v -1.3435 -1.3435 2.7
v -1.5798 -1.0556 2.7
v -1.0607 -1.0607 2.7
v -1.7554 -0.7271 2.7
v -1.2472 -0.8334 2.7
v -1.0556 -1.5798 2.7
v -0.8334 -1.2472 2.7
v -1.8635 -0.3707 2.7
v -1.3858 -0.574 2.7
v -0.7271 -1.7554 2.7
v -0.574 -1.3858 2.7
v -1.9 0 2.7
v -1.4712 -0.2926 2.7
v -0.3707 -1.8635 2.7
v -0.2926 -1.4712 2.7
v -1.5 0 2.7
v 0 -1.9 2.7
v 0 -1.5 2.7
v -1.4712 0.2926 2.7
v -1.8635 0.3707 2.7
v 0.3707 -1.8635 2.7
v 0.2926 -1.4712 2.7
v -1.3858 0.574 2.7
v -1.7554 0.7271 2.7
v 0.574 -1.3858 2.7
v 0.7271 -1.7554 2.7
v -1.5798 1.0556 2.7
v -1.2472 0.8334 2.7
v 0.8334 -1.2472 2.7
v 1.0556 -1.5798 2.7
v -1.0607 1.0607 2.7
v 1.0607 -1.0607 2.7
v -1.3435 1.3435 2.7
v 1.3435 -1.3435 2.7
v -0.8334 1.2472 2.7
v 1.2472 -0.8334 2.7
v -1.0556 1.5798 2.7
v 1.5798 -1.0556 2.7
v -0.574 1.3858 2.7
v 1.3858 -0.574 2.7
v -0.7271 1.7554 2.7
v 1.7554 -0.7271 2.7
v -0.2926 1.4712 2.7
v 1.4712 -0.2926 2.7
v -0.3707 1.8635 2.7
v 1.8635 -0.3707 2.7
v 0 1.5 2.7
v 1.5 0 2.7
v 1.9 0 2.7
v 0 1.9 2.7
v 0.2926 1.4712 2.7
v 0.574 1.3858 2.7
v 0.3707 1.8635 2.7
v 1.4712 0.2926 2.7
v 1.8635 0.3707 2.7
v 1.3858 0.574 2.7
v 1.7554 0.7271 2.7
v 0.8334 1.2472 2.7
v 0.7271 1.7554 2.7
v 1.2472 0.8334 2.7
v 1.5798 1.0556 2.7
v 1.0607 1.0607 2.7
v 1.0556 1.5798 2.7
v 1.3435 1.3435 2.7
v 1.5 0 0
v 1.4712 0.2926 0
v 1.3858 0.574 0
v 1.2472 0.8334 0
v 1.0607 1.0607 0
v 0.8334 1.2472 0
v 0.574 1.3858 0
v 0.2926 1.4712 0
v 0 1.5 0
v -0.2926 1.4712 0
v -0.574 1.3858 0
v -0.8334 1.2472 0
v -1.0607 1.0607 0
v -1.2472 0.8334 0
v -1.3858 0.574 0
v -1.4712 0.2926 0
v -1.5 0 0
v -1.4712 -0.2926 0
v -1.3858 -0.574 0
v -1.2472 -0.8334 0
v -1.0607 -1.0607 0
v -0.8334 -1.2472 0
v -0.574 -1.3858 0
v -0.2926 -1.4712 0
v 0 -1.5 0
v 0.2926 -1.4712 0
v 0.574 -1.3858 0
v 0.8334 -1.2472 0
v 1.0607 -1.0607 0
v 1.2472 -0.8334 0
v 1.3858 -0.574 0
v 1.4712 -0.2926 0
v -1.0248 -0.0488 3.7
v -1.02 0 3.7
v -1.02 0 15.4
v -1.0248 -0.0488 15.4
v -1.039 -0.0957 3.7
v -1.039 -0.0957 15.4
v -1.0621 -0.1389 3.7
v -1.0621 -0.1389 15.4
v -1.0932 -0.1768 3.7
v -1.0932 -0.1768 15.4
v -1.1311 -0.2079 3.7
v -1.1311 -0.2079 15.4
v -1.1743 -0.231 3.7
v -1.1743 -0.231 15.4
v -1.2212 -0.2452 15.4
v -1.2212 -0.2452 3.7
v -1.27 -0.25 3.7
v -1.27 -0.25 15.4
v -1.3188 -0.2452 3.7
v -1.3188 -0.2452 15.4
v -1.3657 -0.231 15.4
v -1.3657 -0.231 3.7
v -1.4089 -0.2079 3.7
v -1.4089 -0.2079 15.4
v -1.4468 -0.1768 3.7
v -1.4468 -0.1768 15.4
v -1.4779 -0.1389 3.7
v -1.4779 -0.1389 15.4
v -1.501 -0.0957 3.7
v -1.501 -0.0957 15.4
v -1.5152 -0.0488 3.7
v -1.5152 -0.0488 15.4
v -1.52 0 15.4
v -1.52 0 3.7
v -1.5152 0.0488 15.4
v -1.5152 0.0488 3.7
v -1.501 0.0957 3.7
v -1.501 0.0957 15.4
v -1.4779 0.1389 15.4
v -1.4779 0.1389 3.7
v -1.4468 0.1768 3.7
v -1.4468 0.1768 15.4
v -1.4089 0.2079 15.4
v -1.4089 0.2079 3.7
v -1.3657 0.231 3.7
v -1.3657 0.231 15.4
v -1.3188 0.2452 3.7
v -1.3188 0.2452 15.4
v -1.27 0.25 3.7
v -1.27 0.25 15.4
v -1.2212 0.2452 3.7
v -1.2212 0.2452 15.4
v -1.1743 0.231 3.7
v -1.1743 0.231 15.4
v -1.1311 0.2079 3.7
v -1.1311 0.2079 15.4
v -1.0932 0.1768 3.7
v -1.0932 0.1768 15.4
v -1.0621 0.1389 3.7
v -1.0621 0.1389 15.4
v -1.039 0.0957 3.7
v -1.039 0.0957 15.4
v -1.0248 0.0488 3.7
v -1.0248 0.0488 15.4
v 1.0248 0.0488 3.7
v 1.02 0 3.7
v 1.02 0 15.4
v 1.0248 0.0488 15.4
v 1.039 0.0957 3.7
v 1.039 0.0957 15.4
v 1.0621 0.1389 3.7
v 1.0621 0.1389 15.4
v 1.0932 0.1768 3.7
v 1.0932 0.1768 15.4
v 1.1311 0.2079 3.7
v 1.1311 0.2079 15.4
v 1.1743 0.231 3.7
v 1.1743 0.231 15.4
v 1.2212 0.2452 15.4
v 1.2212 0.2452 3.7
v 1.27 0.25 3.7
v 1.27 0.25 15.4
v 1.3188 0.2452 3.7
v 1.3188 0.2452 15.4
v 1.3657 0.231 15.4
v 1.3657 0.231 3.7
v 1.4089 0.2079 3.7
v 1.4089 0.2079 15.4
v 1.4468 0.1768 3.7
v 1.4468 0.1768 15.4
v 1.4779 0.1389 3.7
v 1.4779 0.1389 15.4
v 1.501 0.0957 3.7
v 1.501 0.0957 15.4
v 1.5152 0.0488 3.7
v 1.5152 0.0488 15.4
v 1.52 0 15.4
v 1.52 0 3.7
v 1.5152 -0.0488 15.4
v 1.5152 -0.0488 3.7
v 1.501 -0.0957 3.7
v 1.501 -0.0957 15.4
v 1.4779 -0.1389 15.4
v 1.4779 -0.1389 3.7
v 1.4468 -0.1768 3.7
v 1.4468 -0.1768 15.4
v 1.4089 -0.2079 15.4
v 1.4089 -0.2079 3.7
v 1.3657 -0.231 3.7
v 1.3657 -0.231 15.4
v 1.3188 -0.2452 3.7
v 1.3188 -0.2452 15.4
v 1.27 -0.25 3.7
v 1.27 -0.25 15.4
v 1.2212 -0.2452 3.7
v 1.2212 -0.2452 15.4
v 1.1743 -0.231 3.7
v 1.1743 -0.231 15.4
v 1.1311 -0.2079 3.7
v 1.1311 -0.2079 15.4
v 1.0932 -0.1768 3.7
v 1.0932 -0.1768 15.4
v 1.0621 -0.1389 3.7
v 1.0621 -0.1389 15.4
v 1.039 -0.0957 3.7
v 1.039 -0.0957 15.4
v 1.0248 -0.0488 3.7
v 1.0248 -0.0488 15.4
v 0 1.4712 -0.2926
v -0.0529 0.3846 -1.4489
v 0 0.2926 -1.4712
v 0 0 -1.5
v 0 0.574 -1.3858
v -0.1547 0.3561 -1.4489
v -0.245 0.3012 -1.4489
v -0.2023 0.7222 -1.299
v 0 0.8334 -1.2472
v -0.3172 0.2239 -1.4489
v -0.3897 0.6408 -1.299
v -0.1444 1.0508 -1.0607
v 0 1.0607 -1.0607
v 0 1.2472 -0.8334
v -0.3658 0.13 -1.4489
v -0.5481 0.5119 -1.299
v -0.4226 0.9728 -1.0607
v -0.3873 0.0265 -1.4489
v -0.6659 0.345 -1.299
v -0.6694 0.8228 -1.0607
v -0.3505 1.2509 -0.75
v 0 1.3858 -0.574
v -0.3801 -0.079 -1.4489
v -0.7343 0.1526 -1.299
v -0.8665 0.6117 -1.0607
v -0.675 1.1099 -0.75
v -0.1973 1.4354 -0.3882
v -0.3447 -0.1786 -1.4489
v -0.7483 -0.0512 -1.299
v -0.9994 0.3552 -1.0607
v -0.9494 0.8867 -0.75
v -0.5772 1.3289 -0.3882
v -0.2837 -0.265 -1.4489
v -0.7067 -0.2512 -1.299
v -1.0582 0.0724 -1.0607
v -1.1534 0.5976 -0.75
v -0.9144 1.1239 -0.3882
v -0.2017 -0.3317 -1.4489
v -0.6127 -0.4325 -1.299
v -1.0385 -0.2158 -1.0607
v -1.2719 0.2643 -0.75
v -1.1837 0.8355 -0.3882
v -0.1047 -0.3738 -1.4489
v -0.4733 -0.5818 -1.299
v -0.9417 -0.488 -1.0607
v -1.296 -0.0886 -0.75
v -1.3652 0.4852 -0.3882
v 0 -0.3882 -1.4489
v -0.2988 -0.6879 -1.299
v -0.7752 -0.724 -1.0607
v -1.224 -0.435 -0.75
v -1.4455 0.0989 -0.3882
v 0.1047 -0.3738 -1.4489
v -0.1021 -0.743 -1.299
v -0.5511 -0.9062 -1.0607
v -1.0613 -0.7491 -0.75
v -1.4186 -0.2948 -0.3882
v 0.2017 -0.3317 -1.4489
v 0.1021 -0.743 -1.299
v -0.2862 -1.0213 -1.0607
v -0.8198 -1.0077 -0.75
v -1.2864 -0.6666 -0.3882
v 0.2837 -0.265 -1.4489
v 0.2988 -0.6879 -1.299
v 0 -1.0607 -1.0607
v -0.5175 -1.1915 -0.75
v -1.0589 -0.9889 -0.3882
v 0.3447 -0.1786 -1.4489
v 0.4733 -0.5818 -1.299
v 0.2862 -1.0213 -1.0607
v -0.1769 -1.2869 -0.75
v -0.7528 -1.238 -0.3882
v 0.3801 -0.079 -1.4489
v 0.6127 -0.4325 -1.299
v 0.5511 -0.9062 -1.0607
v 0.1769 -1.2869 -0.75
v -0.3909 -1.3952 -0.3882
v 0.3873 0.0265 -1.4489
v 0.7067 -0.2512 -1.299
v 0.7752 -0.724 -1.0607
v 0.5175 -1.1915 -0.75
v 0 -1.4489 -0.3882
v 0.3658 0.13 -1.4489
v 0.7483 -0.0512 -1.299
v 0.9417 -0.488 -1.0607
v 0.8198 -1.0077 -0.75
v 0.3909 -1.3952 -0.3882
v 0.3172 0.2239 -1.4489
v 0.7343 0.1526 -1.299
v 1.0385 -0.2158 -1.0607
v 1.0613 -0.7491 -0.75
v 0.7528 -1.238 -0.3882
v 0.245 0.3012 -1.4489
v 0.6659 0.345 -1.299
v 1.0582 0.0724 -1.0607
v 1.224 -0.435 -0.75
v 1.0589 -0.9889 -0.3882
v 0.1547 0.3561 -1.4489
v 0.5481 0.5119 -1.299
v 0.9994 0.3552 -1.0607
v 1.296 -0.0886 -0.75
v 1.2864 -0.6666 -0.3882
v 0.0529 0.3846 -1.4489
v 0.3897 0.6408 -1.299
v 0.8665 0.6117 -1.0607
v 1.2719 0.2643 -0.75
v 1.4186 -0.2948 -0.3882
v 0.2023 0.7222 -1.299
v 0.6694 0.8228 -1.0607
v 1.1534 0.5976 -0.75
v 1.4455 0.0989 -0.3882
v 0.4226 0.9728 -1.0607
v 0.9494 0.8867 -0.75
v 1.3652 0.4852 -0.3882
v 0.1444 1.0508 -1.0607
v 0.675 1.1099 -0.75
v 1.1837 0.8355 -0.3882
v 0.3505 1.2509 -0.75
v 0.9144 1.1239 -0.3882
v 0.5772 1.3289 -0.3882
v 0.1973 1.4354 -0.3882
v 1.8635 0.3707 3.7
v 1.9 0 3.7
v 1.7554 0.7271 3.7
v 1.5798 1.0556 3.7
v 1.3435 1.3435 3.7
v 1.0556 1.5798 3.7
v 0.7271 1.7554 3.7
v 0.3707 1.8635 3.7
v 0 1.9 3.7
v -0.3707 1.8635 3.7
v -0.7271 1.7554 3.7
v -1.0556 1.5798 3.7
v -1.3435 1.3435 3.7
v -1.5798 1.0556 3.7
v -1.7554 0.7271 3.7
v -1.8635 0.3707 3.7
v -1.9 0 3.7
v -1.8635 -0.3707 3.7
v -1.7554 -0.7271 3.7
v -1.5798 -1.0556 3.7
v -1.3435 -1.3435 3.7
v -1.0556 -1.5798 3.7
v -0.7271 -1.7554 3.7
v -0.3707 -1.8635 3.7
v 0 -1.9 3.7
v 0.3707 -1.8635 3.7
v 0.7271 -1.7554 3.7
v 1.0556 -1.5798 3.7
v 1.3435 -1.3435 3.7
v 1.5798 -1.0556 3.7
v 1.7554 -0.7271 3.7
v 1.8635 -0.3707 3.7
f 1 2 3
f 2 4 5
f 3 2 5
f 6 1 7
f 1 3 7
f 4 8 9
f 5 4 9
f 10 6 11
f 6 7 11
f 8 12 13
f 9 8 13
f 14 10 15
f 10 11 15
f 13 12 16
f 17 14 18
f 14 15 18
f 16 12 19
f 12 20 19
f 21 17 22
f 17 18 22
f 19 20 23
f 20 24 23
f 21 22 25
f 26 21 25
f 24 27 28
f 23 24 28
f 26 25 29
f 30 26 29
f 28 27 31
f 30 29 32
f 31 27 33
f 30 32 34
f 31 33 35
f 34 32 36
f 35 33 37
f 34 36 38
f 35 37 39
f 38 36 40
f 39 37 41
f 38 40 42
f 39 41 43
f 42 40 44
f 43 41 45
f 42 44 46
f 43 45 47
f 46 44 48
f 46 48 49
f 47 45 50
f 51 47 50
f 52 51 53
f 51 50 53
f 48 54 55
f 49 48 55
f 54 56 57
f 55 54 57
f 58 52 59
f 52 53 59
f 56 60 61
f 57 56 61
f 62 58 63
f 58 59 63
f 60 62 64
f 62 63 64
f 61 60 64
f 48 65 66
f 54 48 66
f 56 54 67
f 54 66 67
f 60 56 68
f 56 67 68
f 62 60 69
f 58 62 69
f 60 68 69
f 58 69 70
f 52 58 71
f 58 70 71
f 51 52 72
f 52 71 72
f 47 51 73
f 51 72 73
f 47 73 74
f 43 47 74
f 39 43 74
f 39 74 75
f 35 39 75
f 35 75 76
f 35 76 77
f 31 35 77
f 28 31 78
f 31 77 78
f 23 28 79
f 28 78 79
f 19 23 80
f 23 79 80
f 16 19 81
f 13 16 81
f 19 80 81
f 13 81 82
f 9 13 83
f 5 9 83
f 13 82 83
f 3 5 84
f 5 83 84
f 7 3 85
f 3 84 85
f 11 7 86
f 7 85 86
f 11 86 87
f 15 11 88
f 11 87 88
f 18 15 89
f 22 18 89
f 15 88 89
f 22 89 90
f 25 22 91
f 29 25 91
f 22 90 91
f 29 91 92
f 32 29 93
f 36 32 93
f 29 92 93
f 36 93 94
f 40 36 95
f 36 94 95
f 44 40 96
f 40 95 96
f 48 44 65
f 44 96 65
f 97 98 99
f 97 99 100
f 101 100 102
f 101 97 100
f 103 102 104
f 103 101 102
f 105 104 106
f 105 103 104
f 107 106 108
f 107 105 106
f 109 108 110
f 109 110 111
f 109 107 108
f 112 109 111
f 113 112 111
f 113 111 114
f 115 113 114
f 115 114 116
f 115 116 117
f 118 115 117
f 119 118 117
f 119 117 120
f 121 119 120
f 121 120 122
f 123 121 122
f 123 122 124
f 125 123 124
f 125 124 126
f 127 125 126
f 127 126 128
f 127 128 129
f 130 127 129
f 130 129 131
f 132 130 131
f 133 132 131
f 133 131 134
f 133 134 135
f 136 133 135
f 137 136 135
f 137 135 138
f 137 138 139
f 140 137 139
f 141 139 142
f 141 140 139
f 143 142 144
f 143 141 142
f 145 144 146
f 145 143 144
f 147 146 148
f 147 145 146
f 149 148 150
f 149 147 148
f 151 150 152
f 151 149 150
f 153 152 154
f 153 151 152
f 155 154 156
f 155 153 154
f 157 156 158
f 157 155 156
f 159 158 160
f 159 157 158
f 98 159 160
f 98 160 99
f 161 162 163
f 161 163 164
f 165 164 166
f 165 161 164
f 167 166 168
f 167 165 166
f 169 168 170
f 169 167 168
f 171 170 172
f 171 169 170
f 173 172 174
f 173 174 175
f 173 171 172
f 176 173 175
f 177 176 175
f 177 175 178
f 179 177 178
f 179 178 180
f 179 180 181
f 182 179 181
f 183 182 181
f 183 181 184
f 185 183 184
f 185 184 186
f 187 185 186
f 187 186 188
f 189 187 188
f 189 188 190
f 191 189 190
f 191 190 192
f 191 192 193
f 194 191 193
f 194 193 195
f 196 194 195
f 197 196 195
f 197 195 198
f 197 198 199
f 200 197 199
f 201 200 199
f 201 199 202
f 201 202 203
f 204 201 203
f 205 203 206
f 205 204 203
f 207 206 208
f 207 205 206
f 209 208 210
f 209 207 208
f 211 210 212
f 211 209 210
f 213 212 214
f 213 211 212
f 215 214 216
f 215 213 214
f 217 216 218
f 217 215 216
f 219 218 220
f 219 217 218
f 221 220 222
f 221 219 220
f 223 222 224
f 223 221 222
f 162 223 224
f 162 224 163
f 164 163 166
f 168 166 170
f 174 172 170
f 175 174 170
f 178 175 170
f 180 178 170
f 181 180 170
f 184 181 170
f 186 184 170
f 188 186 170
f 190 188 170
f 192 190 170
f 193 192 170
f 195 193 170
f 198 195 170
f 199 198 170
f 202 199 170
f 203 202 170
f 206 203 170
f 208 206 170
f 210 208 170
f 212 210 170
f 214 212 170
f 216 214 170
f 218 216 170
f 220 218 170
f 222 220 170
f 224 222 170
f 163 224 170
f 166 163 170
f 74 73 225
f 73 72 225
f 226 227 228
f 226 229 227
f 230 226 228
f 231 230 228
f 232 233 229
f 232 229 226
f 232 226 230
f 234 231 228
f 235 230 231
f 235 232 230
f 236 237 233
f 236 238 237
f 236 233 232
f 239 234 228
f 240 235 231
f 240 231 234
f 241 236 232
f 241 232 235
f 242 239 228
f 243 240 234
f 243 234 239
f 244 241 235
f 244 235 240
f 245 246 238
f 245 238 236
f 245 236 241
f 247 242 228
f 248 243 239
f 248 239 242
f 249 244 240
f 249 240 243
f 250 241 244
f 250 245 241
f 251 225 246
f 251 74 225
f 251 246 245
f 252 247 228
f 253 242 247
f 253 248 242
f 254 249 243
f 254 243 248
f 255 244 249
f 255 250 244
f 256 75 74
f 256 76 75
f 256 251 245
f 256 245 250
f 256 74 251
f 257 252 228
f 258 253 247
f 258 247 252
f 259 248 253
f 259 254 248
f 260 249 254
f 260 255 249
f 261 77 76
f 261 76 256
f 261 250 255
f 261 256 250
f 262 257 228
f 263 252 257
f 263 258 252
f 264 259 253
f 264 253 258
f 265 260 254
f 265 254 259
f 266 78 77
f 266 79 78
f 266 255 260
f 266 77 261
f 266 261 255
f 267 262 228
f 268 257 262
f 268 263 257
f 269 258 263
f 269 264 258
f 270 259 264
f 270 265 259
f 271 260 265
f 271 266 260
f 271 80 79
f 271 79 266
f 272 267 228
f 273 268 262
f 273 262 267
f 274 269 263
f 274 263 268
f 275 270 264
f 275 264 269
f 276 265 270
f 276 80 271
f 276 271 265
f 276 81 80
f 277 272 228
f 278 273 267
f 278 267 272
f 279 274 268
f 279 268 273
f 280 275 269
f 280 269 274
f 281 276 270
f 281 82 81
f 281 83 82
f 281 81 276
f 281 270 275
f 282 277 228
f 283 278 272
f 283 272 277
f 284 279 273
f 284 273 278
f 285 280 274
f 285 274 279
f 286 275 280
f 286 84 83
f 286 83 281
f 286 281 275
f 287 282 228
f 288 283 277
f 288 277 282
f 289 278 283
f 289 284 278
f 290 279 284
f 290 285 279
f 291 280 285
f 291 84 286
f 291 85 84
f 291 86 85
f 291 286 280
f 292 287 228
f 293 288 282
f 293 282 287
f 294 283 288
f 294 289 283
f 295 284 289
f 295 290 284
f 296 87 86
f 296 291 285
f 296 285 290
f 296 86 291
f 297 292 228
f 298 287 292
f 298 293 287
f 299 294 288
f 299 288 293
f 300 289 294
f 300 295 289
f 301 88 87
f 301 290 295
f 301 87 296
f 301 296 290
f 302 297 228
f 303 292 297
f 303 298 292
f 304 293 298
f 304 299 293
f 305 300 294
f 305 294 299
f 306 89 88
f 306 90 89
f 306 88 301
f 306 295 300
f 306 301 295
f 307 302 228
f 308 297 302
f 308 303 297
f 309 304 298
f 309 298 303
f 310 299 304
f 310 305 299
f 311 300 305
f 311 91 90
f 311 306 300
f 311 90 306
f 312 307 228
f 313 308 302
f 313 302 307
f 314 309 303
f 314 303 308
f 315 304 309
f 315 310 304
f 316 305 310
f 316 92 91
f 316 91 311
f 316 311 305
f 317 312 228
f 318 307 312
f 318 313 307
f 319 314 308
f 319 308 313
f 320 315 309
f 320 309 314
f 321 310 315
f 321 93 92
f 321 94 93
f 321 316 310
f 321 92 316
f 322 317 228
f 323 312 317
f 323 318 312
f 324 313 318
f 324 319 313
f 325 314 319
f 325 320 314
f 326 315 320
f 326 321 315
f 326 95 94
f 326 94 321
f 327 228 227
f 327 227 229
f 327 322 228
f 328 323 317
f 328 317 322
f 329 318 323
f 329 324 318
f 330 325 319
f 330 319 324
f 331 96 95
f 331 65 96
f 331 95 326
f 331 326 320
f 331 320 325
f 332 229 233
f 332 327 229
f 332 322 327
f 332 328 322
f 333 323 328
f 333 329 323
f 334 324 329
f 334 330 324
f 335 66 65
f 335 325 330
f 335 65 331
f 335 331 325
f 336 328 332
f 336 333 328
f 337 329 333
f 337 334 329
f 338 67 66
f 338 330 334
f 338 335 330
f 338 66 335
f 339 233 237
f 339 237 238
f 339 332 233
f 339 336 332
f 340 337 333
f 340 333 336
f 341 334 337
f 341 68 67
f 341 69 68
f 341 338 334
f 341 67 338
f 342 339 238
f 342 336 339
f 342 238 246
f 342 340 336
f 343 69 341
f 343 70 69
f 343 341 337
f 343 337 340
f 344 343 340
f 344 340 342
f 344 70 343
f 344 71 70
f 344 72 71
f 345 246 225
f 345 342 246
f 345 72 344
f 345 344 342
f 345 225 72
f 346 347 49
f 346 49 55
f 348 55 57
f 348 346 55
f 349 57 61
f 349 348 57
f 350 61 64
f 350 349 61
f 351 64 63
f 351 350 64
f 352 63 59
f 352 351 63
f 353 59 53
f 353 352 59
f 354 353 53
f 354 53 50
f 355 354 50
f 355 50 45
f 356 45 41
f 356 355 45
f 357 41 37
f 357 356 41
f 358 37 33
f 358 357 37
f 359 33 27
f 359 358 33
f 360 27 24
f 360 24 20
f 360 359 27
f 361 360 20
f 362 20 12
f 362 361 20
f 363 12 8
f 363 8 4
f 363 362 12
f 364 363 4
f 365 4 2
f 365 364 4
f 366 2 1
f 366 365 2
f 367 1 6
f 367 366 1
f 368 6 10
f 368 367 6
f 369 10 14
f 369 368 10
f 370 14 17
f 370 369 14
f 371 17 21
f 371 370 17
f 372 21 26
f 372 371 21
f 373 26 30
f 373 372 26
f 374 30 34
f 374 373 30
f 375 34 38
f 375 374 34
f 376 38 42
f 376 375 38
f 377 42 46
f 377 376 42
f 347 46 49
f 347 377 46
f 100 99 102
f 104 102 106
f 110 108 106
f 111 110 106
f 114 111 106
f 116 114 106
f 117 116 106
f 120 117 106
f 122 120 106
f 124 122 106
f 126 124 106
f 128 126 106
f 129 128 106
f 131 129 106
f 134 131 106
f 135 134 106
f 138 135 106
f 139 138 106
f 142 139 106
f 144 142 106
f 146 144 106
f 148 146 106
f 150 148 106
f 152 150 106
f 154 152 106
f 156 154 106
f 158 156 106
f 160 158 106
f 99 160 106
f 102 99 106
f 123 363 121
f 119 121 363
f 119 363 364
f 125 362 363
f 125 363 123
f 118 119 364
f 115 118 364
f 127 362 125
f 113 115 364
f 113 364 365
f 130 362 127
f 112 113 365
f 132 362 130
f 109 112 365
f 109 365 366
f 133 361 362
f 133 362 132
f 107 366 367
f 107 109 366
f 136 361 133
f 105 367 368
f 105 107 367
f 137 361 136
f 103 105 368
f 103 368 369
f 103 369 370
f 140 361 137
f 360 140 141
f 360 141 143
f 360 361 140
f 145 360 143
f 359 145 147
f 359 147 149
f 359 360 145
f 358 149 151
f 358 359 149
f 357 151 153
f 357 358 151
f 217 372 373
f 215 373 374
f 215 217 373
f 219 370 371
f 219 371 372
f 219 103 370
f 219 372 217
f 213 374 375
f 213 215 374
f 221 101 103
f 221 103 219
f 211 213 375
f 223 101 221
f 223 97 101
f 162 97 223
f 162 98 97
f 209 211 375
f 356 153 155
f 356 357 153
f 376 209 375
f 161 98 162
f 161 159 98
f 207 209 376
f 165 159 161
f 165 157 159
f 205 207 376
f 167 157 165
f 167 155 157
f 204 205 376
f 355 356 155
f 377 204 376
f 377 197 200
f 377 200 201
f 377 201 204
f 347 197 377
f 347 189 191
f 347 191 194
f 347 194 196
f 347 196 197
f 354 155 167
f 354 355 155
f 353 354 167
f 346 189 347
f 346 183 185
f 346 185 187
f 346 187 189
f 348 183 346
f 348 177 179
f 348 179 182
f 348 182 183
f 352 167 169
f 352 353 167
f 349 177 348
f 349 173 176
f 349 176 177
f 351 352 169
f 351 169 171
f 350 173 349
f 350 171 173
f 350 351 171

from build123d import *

# Parameters (mm, degrees)
SKETCH_1_R      = 1.5
EXTRUDE_1_DEPTH = 3.7
SKETCH_2_R      = 1.9
EXTRUDE_2_DEPTH = 1
SKETCH_3_R      = 0.25
EXTRUDE_3_DEPTH = 12.7


with BuildPart() as part:
    # 草图1 → 拉伸1 (new body)
    with BuildSketch(Plane.XY):
        Circle(SKETCH_1_R)
    extrude(amount=EXTRUDE_1_DEPTH)

    # 草图2 → 拉伸2 (add)
    with BuildSketch(Plane.XY.offset(3.7)):
        Circle(SKETCH_2_R)
    extrude(amount=-EXTRUDE_2_DEPTH)

    # 草图3 → 拉伸3 (add)
    with BuildSketch(Plane(origin=(0, 0, 2.7), x_dir=(-1, 0, 0), z_dir=(0, 0, -1))):
        with Locations((-1.27, 0)):
            Circle(SKETCH_3_R)
        with Locations(Location((1.27, 0, 0), (0, 0, 180))):
            Circle(SKETCH_3_R)
    extrude(amount=-EXTRUDE_3_DEPTH)

    # 草图5 → 旋转2 (revolve)
    with BuildSketch(Plane(origin=(0, 0, 0), x_dir=(0, 0, -1), z_dir=(1, 0, 0))):
        with BuildLine():
            Line((0, 1.5), (0, 0))
            Line((0, 0), (1.5, 0))
            ThreePointArc((1.5, 0), (1.060660172, 1.060660172), (0, 1.5))
        make_face()
    revolve(axis=Axis((0, 0, -1.5), (0, 0, 1)))


solid = part.part
